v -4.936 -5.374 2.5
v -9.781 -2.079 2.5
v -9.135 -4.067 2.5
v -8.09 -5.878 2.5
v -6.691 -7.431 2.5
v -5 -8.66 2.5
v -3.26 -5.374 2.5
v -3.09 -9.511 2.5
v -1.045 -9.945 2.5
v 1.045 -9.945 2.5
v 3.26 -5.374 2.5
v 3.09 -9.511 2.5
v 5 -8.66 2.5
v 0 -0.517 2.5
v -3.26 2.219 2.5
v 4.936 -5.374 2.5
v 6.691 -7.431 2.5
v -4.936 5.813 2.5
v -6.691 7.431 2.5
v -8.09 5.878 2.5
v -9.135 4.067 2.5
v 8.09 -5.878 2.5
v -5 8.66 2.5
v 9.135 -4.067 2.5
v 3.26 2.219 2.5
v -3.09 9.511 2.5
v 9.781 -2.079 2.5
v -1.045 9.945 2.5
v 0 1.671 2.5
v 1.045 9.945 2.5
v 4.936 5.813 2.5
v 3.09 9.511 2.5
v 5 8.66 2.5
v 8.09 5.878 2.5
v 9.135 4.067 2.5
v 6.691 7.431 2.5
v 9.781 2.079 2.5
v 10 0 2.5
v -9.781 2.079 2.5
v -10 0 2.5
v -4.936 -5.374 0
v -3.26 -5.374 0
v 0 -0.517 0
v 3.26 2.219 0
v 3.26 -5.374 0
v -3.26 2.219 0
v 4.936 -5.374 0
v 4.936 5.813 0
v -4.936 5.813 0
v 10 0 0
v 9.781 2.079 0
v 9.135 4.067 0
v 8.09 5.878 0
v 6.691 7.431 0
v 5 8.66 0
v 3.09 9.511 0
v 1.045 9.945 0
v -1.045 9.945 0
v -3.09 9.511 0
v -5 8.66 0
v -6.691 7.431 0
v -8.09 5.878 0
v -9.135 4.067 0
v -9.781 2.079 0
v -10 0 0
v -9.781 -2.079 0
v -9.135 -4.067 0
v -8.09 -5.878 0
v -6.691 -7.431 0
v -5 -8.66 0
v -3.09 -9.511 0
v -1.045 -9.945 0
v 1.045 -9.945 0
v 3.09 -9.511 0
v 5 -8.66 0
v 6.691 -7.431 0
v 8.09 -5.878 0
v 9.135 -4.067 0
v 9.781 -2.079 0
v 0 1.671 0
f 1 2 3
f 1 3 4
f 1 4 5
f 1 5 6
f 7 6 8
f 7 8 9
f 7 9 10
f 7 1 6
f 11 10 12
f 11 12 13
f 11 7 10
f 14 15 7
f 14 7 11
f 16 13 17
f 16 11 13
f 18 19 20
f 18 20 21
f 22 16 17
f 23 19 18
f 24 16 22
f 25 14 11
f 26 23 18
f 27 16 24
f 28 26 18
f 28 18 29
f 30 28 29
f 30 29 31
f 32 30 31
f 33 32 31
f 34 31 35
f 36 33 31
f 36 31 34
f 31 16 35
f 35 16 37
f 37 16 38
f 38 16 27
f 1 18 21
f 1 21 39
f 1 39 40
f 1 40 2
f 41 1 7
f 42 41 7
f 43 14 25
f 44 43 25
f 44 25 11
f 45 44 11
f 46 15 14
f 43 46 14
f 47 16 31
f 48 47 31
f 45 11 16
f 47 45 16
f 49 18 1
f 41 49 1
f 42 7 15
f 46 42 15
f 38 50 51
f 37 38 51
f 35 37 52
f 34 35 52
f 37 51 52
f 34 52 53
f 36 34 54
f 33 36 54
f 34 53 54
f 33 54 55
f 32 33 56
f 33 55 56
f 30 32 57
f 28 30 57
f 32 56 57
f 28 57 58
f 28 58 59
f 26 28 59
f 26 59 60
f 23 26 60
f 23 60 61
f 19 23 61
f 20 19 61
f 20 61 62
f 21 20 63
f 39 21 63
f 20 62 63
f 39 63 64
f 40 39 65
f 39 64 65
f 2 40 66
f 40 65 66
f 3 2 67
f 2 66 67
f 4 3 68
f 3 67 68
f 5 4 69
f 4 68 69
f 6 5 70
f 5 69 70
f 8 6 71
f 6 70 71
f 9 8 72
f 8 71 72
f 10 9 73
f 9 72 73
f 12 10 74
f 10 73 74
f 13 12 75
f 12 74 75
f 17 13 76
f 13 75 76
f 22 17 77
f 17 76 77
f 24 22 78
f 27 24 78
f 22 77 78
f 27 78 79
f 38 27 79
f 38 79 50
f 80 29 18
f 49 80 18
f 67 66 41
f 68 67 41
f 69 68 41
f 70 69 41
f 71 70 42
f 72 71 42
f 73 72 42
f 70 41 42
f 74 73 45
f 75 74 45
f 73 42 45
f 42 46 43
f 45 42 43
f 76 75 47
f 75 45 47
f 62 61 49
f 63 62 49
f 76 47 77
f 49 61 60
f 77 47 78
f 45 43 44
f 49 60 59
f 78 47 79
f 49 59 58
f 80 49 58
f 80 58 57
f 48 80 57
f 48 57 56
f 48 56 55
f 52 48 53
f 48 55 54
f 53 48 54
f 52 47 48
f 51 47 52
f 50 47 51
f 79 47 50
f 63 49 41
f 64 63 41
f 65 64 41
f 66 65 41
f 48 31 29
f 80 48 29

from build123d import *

# Parameters (mm, degrees)
F0_R     = 10
F1_DEPTH = 2.5
F3_DEPTH = 2.501


with BuildPart() as f1:
    # F0 (on Top) → F1 (new body)
    with BuildSketch(Plane.XY):
        Circle(F0_R)
    extrude(amount=F1_DEPTH)

    # F2 (on face) → F3 (cut, through all)
    with BuildSketch(Plane.XY.offset(2.5)):
        Polygon((4.935878, 5.812861), (0, 1.671168), (-4.935878, 5.812861), (-4.935878, -5.373671), (-3.259804, -5.373671), (-3.259804, 2.218509), (0, -0.516791), (3.259804, 2.218509), (3.259804, -5.373671), (4.935878, -5.373671), align=None)
    extrude(amount=-F3_DEPTH, mode=Mode.SUBTRACT)


solid = f1.part
